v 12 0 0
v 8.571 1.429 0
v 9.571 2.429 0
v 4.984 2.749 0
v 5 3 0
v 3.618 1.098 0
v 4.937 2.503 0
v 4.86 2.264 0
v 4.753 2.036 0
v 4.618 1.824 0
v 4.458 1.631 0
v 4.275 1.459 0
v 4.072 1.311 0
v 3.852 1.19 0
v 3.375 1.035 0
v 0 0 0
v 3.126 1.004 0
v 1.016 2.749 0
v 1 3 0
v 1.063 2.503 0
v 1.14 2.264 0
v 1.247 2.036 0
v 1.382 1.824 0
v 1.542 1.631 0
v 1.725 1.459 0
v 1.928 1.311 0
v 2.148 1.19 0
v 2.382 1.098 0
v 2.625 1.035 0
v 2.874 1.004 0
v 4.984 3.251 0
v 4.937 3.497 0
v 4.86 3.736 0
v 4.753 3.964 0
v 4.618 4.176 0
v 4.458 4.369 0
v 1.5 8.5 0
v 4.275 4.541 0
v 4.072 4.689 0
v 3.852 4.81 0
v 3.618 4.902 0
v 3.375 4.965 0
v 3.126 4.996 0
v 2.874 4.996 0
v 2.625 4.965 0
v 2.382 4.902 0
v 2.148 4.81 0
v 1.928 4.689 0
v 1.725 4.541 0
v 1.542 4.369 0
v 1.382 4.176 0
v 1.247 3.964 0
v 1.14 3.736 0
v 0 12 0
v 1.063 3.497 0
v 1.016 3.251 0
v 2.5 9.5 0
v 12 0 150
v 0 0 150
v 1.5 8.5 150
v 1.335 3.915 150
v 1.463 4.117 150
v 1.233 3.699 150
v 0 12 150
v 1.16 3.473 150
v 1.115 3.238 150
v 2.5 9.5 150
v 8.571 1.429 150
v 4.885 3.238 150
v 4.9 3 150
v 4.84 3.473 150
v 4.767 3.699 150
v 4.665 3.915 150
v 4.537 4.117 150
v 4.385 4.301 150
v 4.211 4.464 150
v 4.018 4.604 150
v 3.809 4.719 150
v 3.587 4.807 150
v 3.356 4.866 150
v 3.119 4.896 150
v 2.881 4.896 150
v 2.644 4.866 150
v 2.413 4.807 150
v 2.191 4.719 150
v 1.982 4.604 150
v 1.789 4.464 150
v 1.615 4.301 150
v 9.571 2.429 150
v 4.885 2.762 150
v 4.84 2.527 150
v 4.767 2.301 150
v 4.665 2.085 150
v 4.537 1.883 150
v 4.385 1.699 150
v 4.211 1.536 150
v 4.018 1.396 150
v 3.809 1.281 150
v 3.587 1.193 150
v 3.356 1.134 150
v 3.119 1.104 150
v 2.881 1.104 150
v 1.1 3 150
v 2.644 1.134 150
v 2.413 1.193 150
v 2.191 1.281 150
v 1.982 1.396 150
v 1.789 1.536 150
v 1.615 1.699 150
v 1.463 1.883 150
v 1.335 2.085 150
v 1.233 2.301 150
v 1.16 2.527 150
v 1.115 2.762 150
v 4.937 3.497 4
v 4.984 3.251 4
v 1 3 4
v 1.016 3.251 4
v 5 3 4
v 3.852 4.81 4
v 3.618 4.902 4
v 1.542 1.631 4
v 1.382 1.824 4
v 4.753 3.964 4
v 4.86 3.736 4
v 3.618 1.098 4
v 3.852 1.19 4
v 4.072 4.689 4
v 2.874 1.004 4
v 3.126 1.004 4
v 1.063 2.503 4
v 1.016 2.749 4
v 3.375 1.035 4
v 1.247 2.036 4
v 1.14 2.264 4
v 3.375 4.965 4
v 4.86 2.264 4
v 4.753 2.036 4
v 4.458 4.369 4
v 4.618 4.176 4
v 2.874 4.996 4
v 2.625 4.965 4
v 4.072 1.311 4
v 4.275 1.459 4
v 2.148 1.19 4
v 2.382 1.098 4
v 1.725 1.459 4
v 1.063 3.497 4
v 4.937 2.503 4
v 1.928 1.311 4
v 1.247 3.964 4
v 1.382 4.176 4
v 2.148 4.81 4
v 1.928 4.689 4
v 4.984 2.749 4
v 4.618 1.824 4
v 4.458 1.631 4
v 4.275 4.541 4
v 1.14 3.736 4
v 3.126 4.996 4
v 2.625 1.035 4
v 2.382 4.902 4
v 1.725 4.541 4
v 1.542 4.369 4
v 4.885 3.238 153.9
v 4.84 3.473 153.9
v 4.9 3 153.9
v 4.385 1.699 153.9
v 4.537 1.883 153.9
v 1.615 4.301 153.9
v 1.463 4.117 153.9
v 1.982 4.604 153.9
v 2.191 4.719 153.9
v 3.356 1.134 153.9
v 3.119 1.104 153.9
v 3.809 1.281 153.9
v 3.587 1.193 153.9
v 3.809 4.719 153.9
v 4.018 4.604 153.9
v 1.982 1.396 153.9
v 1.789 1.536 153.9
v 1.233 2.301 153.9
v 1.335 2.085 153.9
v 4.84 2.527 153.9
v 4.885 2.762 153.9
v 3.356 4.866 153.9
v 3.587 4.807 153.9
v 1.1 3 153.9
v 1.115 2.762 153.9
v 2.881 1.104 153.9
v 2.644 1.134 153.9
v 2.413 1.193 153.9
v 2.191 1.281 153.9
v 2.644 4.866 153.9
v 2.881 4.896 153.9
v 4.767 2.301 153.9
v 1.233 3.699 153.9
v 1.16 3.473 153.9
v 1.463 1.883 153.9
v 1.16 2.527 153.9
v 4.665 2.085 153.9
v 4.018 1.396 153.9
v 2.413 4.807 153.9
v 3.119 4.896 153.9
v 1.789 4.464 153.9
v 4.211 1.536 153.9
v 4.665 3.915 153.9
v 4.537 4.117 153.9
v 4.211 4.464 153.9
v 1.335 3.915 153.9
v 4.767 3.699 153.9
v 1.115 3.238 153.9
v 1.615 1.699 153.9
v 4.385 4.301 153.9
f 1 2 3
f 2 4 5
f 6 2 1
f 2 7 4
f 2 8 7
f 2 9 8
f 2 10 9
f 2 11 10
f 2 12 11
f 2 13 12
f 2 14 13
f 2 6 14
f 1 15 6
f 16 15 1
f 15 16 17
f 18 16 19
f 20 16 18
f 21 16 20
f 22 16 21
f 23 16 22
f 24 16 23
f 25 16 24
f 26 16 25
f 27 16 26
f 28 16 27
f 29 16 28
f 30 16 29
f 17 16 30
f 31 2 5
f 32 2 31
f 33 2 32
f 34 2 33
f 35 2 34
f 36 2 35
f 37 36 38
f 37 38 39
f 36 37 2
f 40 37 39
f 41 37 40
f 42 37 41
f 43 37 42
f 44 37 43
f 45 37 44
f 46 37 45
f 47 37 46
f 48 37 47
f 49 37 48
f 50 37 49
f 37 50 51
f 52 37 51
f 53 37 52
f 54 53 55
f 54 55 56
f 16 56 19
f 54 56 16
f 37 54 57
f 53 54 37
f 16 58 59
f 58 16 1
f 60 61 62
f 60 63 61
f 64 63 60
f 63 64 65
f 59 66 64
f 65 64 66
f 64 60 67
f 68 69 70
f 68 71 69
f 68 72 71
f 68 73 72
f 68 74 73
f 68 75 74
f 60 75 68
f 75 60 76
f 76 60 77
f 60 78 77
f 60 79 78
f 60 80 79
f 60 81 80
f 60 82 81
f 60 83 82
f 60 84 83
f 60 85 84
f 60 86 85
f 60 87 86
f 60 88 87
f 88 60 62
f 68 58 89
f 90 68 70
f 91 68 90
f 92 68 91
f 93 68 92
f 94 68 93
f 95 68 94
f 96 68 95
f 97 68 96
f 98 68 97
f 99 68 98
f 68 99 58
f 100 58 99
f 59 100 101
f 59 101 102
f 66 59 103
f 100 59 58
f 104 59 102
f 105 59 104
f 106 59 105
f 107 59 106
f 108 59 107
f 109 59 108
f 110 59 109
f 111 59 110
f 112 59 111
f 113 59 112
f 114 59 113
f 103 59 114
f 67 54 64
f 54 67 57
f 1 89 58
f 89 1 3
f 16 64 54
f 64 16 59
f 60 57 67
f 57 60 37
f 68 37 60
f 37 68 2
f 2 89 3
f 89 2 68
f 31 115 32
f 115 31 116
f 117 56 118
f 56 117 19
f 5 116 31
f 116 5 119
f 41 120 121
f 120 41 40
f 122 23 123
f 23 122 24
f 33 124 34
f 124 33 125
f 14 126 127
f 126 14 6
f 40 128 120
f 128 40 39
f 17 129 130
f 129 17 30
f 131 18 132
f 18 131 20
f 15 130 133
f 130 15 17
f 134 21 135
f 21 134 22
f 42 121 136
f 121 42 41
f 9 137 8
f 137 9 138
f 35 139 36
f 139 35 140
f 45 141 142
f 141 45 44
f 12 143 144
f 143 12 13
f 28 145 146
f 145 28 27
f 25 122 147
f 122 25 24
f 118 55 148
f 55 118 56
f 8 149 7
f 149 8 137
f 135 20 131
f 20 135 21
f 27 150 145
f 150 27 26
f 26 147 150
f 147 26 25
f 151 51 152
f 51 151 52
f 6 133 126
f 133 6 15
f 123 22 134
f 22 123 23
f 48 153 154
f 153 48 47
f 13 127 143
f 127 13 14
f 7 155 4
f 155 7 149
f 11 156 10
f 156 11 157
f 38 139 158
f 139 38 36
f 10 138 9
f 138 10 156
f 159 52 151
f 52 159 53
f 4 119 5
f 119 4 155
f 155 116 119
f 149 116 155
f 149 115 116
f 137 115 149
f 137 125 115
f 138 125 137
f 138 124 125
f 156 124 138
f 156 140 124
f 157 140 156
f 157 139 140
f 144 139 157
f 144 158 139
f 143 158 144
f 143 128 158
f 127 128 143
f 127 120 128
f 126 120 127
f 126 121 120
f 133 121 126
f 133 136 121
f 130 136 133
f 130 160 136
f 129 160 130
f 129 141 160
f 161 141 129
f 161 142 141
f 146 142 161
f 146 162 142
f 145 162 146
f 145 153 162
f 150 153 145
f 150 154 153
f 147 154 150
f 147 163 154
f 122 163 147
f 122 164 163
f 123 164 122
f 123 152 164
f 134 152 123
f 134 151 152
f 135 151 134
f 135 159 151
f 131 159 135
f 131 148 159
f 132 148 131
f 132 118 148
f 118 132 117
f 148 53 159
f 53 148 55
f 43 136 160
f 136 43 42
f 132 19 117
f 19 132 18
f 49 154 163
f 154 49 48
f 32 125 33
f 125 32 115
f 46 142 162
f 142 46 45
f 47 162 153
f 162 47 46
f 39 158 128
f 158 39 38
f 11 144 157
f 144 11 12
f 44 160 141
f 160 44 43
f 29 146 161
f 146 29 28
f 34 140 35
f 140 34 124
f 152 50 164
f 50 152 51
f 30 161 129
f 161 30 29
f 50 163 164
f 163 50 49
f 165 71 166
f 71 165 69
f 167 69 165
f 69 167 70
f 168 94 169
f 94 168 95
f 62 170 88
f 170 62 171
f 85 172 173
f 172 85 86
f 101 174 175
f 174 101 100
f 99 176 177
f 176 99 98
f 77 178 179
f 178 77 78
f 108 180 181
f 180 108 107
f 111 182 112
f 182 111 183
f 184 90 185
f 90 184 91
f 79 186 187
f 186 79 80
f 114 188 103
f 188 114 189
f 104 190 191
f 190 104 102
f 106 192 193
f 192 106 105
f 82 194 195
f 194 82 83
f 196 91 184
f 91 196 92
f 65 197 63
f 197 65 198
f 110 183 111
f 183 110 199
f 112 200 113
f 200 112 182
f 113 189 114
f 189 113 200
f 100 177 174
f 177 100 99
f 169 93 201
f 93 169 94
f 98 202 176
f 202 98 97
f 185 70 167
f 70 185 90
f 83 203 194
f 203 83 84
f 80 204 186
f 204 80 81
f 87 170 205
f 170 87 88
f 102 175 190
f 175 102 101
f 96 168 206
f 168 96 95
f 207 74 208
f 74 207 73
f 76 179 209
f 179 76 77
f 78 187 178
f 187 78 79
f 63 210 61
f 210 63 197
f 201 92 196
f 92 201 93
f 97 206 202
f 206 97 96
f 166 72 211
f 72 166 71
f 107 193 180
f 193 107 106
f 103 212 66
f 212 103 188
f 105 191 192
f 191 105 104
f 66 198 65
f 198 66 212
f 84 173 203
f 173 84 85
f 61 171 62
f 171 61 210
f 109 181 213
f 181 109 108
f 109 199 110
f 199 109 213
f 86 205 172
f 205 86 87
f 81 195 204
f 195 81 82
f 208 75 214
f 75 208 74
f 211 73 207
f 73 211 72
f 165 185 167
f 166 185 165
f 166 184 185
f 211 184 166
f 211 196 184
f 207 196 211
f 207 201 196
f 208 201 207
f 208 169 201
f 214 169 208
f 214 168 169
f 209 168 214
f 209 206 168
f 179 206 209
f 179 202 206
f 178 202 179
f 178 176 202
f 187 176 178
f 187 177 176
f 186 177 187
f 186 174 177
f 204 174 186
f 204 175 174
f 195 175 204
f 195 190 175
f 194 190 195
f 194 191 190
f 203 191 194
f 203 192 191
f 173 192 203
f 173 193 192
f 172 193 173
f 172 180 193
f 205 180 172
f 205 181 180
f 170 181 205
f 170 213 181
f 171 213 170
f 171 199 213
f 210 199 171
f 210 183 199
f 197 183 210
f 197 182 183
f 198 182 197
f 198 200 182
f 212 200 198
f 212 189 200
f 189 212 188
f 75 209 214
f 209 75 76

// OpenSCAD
eps = .1;

$fn=50;

ledSupport = [12,12,150];
pin = [2,4];

difference() {
    linear_extrude(ledSupport.z) polygon([[0,0],[ledSupport.x,0],[0,ledSupport.y]]);
    translate([1.5,8.5,-eps/2]) linear_extrude(ledSupport.z+eps) rotate(-45) square([10,2]);
    translate([3,3,-eps]) linear_extrude(pin.y+eps) circle(pin.x);
}

translate([3,3,ledSupport.z]) linear_extrude(pin.y-eps) circle(pin.x-eps);
